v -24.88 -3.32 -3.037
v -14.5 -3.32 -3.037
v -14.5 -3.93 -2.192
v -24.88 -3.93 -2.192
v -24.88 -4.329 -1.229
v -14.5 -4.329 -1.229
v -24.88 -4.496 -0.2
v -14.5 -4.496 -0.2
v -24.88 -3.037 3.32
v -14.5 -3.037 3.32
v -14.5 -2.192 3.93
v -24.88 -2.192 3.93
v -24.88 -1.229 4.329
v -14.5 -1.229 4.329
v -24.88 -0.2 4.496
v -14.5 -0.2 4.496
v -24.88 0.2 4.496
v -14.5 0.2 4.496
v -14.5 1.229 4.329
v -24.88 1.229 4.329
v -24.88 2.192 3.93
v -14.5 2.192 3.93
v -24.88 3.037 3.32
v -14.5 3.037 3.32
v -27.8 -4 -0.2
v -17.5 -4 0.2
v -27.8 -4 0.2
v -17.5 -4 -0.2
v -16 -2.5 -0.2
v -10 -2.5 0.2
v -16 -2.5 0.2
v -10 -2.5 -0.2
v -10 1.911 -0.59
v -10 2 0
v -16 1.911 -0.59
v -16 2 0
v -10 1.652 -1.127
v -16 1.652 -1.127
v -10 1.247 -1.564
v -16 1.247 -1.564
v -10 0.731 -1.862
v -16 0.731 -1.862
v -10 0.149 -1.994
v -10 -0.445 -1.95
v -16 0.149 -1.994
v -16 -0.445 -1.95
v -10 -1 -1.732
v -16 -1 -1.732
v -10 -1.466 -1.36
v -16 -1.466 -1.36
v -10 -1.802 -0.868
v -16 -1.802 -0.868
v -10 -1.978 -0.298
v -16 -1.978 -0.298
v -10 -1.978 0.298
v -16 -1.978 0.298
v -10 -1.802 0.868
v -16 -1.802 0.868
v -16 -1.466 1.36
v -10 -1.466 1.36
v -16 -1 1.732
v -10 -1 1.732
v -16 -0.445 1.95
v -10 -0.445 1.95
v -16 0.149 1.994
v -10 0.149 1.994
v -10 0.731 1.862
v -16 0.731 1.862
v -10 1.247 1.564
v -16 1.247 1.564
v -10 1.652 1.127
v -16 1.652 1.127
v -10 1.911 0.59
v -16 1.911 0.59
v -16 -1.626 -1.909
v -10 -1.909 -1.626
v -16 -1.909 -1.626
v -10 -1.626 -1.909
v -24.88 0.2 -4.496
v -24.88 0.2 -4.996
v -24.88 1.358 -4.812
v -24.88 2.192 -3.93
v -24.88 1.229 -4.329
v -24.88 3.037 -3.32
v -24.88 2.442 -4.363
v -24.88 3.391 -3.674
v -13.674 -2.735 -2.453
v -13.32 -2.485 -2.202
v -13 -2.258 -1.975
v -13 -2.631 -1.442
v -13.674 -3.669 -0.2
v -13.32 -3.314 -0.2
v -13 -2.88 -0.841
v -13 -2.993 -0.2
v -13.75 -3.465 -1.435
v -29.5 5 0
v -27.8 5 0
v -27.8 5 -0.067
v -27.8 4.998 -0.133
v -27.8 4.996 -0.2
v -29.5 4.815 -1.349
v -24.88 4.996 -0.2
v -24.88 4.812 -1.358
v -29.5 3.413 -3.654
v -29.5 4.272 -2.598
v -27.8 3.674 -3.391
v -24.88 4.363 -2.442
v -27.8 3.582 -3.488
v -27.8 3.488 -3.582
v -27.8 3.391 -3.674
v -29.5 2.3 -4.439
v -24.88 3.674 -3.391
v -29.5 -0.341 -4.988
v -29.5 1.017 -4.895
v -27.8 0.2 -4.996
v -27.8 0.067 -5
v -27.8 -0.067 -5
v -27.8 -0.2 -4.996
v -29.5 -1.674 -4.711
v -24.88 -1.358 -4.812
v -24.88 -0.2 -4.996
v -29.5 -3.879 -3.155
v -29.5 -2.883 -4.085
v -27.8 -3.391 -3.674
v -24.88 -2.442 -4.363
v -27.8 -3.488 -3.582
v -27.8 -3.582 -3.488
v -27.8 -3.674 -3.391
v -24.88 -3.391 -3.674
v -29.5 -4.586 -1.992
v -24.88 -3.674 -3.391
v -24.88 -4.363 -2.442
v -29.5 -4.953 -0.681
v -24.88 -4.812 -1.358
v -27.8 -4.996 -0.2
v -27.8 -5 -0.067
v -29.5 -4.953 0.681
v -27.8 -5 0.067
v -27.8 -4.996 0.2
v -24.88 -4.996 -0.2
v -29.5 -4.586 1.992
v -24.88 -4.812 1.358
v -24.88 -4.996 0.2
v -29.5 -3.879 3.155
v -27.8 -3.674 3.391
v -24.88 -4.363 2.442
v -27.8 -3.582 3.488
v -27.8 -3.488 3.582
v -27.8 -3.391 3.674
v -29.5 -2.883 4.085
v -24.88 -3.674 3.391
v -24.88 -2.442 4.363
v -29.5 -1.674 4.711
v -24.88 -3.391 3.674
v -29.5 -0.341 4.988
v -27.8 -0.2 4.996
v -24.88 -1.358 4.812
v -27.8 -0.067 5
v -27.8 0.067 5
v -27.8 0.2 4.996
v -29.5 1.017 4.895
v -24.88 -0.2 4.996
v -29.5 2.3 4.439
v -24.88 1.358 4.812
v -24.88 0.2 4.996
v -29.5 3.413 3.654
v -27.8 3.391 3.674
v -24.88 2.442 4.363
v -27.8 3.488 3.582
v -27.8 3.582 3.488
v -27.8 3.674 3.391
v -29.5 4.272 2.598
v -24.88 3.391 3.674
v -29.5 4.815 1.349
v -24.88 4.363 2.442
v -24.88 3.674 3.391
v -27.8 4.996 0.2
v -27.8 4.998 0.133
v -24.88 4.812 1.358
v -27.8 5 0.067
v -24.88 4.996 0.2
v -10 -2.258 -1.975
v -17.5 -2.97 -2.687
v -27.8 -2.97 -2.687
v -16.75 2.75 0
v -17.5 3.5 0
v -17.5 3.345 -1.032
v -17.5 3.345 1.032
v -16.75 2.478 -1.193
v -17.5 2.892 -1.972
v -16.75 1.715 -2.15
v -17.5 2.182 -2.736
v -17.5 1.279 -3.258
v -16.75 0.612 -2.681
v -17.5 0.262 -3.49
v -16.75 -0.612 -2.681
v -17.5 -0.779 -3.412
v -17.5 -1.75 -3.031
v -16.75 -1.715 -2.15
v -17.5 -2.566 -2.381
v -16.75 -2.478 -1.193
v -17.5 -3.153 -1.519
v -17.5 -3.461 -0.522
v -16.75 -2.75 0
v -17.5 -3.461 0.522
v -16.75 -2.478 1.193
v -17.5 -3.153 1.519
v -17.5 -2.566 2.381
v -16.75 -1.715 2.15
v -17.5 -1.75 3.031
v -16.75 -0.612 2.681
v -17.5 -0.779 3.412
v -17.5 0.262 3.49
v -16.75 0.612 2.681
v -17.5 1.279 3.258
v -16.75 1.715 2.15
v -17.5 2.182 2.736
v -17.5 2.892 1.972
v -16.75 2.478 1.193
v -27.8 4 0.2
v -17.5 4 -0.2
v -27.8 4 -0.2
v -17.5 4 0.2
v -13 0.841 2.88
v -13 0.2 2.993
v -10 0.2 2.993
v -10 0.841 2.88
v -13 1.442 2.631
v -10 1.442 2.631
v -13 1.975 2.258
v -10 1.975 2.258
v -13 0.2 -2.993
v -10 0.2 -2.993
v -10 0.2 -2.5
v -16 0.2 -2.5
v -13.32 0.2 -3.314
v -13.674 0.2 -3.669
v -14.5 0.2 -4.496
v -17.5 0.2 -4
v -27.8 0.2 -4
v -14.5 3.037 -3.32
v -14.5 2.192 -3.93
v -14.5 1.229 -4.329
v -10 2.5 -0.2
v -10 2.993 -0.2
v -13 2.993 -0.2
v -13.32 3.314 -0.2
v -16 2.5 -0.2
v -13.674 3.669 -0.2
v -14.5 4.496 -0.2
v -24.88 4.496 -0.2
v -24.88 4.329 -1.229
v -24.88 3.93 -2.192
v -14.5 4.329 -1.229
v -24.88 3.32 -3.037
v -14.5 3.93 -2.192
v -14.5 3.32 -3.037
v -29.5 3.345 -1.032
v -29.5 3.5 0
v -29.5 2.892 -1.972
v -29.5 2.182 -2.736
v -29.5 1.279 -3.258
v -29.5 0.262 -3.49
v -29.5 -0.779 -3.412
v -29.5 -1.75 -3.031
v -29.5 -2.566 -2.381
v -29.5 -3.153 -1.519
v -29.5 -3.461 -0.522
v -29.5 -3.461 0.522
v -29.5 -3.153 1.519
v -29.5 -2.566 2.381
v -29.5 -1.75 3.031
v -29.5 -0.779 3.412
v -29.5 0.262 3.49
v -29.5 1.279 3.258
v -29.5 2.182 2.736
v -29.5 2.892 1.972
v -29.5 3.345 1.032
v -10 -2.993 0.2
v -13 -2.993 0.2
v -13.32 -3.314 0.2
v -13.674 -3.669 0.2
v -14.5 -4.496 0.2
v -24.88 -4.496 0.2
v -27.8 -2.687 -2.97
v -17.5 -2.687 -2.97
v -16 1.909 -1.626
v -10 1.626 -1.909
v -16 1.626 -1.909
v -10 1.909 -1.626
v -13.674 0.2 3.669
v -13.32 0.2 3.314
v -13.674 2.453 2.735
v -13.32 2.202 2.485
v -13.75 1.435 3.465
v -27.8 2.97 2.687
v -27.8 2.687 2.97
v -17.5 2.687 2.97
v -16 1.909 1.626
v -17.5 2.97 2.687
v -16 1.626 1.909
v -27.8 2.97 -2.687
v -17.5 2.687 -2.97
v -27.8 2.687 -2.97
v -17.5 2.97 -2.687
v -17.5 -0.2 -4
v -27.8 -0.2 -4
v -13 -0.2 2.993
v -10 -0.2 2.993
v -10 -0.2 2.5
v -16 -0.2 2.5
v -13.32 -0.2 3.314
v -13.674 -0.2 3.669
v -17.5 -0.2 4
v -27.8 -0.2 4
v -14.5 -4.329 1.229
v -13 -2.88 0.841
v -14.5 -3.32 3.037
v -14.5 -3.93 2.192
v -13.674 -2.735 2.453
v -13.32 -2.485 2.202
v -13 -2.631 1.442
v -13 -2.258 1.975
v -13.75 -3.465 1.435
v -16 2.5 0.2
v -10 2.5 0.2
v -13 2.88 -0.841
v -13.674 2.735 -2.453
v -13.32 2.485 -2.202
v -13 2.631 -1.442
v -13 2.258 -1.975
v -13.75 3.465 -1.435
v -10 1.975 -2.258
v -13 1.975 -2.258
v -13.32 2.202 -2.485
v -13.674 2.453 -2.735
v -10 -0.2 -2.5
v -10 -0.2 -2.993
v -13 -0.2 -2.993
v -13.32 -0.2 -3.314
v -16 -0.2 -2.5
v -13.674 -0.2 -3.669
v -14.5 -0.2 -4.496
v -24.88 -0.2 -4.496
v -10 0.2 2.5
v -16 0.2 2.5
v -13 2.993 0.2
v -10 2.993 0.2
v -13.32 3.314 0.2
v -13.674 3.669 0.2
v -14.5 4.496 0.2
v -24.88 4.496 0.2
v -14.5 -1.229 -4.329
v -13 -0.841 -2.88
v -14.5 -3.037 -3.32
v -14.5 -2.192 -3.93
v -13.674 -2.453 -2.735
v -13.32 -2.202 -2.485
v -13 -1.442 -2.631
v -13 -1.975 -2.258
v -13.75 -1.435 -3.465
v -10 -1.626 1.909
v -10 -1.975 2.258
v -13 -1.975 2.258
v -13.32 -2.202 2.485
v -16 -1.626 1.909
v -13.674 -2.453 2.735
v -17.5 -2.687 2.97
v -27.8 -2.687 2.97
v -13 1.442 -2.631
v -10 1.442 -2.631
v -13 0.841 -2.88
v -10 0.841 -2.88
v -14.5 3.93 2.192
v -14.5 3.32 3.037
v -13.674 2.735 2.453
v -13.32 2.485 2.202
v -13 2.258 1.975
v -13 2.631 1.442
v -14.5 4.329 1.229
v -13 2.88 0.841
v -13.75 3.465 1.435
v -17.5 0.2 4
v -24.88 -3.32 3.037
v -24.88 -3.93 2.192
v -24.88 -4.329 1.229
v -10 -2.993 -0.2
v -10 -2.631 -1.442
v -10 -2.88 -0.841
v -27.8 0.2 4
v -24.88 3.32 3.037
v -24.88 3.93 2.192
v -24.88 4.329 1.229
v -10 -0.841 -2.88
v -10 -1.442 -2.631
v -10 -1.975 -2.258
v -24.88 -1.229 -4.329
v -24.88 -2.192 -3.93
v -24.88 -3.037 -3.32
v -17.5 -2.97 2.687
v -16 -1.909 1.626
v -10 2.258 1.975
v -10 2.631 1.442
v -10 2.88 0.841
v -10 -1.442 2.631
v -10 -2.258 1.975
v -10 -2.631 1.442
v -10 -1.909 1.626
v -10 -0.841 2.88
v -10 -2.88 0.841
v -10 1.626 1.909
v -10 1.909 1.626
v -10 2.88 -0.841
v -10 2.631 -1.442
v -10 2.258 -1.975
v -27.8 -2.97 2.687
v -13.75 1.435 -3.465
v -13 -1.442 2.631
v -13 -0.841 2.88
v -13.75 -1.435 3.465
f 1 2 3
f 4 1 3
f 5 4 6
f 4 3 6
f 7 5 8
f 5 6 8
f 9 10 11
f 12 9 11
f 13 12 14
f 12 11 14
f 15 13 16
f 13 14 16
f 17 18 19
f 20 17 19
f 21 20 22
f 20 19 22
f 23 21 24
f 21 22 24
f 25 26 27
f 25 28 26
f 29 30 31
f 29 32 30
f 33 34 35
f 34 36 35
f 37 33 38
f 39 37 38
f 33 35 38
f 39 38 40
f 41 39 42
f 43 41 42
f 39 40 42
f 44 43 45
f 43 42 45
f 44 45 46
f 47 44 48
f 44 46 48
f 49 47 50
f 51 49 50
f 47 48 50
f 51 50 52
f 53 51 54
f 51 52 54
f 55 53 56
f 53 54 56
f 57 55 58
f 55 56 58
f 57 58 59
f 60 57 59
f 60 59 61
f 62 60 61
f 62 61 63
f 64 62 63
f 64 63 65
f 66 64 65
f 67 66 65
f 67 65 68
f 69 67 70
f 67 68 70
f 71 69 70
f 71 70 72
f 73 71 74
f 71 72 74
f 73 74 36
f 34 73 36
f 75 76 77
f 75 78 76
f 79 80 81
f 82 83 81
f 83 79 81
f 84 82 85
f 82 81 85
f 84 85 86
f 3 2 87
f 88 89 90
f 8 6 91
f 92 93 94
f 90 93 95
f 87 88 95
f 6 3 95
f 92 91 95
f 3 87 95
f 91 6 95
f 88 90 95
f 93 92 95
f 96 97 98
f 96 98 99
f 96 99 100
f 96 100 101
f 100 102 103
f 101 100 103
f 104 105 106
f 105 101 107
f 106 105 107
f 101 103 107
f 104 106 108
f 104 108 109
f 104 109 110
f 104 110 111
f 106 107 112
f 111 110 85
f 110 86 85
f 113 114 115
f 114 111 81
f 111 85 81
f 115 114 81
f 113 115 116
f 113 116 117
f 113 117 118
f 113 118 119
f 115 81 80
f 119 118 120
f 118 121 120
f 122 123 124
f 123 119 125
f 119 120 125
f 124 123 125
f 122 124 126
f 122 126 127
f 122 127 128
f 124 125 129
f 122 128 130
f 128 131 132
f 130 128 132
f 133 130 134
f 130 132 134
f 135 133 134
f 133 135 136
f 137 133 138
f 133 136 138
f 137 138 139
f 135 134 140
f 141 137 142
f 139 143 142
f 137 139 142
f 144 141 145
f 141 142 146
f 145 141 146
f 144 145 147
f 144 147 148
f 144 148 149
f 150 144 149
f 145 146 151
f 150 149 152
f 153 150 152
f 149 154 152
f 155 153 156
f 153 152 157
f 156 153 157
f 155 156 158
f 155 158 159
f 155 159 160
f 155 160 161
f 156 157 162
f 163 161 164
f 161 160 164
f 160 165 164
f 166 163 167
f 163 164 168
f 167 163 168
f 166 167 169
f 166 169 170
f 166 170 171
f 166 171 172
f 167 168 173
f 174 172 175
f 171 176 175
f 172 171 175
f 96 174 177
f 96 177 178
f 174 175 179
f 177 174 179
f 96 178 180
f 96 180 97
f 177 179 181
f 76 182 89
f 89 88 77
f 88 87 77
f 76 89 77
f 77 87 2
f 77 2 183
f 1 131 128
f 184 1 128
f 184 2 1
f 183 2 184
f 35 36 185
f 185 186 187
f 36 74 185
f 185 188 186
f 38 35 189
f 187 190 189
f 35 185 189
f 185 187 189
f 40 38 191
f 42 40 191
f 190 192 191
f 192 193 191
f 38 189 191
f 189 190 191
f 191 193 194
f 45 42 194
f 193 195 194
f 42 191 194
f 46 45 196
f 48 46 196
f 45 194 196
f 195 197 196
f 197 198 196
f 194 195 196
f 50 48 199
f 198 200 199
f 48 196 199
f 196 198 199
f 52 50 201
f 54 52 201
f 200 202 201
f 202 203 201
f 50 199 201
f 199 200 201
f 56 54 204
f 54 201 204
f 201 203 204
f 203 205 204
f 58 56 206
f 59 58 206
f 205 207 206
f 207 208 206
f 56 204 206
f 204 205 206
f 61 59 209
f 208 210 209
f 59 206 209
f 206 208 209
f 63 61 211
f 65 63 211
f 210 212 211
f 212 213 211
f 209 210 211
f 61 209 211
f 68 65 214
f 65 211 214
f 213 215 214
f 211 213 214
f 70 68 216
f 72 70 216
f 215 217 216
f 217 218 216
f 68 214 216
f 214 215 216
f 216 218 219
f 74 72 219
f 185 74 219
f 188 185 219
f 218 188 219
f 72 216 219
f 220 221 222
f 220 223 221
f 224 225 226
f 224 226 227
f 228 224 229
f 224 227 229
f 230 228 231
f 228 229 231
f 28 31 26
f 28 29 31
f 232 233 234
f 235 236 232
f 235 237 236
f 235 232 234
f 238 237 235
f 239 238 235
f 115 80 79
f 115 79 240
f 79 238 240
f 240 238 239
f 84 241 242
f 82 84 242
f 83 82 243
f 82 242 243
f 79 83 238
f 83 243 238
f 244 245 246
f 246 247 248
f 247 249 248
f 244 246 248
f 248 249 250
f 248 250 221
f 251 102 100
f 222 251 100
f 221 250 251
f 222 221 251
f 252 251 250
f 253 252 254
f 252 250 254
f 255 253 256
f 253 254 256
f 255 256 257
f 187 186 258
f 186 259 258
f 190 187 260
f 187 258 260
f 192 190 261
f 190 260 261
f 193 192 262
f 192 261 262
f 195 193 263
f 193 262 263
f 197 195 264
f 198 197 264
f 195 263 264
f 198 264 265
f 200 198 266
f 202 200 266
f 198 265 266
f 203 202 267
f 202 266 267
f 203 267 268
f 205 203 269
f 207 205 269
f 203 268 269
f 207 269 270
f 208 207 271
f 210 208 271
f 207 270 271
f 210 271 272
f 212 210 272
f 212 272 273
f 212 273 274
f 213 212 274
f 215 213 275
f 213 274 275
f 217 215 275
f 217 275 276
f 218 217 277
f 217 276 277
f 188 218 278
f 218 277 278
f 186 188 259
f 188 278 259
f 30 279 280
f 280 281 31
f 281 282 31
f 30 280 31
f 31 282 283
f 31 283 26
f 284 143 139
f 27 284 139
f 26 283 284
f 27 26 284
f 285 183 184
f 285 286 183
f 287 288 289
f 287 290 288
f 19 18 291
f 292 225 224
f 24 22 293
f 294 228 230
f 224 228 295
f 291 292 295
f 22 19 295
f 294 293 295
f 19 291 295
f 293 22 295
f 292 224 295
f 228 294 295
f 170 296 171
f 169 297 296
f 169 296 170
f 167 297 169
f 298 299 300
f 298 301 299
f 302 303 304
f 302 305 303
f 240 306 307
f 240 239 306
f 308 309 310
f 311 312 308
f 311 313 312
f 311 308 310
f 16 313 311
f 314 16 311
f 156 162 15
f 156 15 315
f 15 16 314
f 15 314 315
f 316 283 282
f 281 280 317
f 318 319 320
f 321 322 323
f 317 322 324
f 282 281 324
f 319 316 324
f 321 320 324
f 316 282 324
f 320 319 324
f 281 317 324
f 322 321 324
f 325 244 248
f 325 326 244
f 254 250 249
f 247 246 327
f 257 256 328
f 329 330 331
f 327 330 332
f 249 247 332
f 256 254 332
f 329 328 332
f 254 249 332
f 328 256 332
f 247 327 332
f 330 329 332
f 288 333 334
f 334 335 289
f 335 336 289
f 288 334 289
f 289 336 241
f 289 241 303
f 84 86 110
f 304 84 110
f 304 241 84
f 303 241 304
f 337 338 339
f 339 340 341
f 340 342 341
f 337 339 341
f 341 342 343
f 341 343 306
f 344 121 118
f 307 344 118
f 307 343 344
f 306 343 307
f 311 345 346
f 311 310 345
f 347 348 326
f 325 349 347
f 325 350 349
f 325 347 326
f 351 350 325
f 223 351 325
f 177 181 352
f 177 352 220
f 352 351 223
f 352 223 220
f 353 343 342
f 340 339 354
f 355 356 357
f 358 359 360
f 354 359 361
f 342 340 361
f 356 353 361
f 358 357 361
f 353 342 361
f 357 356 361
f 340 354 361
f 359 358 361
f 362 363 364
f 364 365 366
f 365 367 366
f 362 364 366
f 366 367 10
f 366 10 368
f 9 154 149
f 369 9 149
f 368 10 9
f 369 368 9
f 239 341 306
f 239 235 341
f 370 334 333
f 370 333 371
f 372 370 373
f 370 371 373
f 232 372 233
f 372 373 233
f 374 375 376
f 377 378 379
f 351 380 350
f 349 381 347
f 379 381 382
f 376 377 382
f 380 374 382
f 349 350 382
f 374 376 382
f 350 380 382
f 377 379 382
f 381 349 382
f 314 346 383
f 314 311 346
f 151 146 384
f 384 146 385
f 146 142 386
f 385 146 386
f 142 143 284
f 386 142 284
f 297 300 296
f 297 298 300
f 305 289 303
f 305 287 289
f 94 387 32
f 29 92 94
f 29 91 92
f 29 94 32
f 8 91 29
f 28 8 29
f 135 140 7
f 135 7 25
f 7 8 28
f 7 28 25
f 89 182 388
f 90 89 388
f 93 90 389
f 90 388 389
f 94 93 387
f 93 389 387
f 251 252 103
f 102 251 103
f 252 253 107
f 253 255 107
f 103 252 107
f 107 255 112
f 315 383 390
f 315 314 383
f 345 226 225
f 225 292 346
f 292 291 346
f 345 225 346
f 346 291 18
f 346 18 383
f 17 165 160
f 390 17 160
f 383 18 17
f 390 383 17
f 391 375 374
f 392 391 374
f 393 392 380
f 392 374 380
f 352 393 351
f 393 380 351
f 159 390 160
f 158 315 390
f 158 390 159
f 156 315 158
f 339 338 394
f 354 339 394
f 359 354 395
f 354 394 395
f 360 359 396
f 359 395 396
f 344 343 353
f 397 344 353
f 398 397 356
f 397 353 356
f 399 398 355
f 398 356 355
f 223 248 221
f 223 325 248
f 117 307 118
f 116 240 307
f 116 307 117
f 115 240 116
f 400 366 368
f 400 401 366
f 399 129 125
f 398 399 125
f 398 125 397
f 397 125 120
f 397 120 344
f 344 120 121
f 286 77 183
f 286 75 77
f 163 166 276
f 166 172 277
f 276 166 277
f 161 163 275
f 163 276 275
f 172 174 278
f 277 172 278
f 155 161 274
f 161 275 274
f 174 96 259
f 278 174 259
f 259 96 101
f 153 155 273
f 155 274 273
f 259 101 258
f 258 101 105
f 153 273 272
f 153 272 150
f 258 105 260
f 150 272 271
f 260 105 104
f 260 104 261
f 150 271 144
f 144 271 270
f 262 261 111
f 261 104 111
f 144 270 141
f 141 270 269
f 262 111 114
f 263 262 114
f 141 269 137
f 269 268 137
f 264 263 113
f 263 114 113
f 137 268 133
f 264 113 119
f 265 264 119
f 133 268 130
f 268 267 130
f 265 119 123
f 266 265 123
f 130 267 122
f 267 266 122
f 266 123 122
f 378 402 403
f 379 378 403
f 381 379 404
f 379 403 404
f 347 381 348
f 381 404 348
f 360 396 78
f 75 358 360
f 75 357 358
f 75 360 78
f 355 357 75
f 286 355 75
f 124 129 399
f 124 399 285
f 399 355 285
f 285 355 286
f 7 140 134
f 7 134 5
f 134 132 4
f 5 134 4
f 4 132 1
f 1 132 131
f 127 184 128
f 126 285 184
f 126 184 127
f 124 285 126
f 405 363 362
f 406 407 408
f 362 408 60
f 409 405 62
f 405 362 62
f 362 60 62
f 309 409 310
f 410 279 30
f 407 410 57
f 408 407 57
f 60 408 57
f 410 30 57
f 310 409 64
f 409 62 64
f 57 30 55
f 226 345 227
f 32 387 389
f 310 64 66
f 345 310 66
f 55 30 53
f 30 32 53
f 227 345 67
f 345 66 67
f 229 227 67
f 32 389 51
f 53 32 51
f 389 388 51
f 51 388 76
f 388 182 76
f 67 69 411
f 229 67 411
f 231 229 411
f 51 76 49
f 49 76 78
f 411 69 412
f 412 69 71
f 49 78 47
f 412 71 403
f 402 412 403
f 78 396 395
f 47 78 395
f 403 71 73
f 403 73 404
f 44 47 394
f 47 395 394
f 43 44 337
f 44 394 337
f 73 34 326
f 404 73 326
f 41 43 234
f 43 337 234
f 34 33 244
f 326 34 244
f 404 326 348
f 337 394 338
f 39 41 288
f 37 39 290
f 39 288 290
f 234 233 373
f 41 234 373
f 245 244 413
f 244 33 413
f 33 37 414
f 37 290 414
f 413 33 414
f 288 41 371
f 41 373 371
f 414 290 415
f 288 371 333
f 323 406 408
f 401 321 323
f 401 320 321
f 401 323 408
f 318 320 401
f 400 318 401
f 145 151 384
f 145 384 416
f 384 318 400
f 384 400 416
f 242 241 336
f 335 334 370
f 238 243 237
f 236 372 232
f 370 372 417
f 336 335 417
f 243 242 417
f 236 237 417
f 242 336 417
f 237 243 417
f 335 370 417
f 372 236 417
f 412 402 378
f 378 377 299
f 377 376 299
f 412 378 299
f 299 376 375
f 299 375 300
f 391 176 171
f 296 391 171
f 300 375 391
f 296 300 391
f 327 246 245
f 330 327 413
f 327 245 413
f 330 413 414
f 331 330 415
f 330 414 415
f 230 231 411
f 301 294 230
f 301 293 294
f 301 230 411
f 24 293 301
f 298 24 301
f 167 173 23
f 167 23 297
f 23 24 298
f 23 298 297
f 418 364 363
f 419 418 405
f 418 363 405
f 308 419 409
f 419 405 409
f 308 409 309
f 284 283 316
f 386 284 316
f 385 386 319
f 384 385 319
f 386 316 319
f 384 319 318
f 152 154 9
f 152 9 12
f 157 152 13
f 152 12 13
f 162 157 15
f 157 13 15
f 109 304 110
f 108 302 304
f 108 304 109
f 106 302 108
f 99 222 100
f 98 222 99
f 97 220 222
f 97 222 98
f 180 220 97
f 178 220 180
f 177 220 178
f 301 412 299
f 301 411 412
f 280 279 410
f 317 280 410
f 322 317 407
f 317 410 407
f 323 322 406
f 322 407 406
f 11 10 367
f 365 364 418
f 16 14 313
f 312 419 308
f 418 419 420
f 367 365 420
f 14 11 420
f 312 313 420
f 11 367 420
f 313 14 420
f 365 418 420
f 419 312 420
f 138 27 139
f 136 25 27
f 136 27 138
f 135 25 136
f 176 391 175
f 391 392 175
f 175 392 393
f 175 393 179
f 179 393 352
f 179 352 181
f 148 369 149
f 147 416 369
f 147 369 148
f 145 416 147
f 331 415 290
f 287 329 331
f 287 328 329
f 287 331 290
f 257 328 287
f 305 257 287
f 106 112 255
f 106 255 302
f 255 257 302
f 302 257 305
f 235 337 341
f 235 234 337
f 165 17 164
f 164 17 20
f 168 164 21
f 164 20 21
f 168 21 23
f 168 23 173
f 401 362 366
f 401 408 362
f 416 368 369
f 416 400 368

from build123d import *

# Parameters (mm, degrees)
CUT_EXTRUDE2_DEPTH = 0.2
CIRPATTERN2_COUNT  = 8
SKETCH4_W          = 0.4
SKETCH4_H          = 0.75
CUT_EXTRUDE3_DEPTH = 1
CIRPATTERN3_COUNT  = 8


with BuildPart() as part:
    # Sketch1 → Revolve1 (revolve)
    with BuildSketch(Plane.XY):
        Polygon((-10, 3), (-10, 2), (-16, 2), (-17.5, 3.5), (-29.5, 3.5), (-29.5, 5), (-24.88, 5), (-24.88, 4.5), (-14.5, 4.5), (-13, 3), align=None)
    revolve(axis=Axis((0, 0, 0), (-1, 0, 0)))

    # Sketch3 → Cut-Extrude2 (cut, symmetric)
    with BuildSketch(Plane.XY):
        Polygon((-14.5, 4.5), (-13, 3), (-10, 3), (-10, 2.5), (-16, 2.5), (-17.5, 4), (-27.8, 4), (-27.8, 5.5), (-24.88457259, 5.5), (-24.88457259, 4.5), align=None)
    cut_extrude2 = extrude(amount=CUT_EXTRUDE2_DEPTH, both=True, mode=Mode.SUBTRACT)

    # CirPattern2: Cut-Extrude2 ×8 about axis
    cirpattern2_axis = Axis((-10, 0, 0), (1, 0, 0))
    for i in range(1, CIRPATTERN2_COUNT):
        add(cut_extrude2.rotate(cirpattern2_axis, i * 360 / CIRPATTERN2_COUNT), mode=Mode.SUBTRACT)

    # Sketch4 → Cut-Extrude3 (cut)
    with BuildSketch(Plane(origin=(-24.88, 0, 0), x_dir=(0, 0, -1), z_dir=(1, 0, 0))):
        with Locations((0, 4.872999199)):
            Rectangle(SKETCH4_W, SKETCH4_H)
    cut_extrude3 = extrude(amount=-CUT_EXTRUDE3_DEPTH, mode=Mode.SUBTRACT)

    # CirPattern3: Cut-Extrude3 ×8 about axis
    cirpattern3_axis = Axis((-24.88, 0, 0), (1, 0, 0))
    for i in range(1, CIRPATTERN3_COUNT):
        add(cut_extrude3.rotate(cirpattern3_axis, i * 360 / CIRPATTERN3_COUNT), mode=Mode.SUBTRACT)


solid = part.part
